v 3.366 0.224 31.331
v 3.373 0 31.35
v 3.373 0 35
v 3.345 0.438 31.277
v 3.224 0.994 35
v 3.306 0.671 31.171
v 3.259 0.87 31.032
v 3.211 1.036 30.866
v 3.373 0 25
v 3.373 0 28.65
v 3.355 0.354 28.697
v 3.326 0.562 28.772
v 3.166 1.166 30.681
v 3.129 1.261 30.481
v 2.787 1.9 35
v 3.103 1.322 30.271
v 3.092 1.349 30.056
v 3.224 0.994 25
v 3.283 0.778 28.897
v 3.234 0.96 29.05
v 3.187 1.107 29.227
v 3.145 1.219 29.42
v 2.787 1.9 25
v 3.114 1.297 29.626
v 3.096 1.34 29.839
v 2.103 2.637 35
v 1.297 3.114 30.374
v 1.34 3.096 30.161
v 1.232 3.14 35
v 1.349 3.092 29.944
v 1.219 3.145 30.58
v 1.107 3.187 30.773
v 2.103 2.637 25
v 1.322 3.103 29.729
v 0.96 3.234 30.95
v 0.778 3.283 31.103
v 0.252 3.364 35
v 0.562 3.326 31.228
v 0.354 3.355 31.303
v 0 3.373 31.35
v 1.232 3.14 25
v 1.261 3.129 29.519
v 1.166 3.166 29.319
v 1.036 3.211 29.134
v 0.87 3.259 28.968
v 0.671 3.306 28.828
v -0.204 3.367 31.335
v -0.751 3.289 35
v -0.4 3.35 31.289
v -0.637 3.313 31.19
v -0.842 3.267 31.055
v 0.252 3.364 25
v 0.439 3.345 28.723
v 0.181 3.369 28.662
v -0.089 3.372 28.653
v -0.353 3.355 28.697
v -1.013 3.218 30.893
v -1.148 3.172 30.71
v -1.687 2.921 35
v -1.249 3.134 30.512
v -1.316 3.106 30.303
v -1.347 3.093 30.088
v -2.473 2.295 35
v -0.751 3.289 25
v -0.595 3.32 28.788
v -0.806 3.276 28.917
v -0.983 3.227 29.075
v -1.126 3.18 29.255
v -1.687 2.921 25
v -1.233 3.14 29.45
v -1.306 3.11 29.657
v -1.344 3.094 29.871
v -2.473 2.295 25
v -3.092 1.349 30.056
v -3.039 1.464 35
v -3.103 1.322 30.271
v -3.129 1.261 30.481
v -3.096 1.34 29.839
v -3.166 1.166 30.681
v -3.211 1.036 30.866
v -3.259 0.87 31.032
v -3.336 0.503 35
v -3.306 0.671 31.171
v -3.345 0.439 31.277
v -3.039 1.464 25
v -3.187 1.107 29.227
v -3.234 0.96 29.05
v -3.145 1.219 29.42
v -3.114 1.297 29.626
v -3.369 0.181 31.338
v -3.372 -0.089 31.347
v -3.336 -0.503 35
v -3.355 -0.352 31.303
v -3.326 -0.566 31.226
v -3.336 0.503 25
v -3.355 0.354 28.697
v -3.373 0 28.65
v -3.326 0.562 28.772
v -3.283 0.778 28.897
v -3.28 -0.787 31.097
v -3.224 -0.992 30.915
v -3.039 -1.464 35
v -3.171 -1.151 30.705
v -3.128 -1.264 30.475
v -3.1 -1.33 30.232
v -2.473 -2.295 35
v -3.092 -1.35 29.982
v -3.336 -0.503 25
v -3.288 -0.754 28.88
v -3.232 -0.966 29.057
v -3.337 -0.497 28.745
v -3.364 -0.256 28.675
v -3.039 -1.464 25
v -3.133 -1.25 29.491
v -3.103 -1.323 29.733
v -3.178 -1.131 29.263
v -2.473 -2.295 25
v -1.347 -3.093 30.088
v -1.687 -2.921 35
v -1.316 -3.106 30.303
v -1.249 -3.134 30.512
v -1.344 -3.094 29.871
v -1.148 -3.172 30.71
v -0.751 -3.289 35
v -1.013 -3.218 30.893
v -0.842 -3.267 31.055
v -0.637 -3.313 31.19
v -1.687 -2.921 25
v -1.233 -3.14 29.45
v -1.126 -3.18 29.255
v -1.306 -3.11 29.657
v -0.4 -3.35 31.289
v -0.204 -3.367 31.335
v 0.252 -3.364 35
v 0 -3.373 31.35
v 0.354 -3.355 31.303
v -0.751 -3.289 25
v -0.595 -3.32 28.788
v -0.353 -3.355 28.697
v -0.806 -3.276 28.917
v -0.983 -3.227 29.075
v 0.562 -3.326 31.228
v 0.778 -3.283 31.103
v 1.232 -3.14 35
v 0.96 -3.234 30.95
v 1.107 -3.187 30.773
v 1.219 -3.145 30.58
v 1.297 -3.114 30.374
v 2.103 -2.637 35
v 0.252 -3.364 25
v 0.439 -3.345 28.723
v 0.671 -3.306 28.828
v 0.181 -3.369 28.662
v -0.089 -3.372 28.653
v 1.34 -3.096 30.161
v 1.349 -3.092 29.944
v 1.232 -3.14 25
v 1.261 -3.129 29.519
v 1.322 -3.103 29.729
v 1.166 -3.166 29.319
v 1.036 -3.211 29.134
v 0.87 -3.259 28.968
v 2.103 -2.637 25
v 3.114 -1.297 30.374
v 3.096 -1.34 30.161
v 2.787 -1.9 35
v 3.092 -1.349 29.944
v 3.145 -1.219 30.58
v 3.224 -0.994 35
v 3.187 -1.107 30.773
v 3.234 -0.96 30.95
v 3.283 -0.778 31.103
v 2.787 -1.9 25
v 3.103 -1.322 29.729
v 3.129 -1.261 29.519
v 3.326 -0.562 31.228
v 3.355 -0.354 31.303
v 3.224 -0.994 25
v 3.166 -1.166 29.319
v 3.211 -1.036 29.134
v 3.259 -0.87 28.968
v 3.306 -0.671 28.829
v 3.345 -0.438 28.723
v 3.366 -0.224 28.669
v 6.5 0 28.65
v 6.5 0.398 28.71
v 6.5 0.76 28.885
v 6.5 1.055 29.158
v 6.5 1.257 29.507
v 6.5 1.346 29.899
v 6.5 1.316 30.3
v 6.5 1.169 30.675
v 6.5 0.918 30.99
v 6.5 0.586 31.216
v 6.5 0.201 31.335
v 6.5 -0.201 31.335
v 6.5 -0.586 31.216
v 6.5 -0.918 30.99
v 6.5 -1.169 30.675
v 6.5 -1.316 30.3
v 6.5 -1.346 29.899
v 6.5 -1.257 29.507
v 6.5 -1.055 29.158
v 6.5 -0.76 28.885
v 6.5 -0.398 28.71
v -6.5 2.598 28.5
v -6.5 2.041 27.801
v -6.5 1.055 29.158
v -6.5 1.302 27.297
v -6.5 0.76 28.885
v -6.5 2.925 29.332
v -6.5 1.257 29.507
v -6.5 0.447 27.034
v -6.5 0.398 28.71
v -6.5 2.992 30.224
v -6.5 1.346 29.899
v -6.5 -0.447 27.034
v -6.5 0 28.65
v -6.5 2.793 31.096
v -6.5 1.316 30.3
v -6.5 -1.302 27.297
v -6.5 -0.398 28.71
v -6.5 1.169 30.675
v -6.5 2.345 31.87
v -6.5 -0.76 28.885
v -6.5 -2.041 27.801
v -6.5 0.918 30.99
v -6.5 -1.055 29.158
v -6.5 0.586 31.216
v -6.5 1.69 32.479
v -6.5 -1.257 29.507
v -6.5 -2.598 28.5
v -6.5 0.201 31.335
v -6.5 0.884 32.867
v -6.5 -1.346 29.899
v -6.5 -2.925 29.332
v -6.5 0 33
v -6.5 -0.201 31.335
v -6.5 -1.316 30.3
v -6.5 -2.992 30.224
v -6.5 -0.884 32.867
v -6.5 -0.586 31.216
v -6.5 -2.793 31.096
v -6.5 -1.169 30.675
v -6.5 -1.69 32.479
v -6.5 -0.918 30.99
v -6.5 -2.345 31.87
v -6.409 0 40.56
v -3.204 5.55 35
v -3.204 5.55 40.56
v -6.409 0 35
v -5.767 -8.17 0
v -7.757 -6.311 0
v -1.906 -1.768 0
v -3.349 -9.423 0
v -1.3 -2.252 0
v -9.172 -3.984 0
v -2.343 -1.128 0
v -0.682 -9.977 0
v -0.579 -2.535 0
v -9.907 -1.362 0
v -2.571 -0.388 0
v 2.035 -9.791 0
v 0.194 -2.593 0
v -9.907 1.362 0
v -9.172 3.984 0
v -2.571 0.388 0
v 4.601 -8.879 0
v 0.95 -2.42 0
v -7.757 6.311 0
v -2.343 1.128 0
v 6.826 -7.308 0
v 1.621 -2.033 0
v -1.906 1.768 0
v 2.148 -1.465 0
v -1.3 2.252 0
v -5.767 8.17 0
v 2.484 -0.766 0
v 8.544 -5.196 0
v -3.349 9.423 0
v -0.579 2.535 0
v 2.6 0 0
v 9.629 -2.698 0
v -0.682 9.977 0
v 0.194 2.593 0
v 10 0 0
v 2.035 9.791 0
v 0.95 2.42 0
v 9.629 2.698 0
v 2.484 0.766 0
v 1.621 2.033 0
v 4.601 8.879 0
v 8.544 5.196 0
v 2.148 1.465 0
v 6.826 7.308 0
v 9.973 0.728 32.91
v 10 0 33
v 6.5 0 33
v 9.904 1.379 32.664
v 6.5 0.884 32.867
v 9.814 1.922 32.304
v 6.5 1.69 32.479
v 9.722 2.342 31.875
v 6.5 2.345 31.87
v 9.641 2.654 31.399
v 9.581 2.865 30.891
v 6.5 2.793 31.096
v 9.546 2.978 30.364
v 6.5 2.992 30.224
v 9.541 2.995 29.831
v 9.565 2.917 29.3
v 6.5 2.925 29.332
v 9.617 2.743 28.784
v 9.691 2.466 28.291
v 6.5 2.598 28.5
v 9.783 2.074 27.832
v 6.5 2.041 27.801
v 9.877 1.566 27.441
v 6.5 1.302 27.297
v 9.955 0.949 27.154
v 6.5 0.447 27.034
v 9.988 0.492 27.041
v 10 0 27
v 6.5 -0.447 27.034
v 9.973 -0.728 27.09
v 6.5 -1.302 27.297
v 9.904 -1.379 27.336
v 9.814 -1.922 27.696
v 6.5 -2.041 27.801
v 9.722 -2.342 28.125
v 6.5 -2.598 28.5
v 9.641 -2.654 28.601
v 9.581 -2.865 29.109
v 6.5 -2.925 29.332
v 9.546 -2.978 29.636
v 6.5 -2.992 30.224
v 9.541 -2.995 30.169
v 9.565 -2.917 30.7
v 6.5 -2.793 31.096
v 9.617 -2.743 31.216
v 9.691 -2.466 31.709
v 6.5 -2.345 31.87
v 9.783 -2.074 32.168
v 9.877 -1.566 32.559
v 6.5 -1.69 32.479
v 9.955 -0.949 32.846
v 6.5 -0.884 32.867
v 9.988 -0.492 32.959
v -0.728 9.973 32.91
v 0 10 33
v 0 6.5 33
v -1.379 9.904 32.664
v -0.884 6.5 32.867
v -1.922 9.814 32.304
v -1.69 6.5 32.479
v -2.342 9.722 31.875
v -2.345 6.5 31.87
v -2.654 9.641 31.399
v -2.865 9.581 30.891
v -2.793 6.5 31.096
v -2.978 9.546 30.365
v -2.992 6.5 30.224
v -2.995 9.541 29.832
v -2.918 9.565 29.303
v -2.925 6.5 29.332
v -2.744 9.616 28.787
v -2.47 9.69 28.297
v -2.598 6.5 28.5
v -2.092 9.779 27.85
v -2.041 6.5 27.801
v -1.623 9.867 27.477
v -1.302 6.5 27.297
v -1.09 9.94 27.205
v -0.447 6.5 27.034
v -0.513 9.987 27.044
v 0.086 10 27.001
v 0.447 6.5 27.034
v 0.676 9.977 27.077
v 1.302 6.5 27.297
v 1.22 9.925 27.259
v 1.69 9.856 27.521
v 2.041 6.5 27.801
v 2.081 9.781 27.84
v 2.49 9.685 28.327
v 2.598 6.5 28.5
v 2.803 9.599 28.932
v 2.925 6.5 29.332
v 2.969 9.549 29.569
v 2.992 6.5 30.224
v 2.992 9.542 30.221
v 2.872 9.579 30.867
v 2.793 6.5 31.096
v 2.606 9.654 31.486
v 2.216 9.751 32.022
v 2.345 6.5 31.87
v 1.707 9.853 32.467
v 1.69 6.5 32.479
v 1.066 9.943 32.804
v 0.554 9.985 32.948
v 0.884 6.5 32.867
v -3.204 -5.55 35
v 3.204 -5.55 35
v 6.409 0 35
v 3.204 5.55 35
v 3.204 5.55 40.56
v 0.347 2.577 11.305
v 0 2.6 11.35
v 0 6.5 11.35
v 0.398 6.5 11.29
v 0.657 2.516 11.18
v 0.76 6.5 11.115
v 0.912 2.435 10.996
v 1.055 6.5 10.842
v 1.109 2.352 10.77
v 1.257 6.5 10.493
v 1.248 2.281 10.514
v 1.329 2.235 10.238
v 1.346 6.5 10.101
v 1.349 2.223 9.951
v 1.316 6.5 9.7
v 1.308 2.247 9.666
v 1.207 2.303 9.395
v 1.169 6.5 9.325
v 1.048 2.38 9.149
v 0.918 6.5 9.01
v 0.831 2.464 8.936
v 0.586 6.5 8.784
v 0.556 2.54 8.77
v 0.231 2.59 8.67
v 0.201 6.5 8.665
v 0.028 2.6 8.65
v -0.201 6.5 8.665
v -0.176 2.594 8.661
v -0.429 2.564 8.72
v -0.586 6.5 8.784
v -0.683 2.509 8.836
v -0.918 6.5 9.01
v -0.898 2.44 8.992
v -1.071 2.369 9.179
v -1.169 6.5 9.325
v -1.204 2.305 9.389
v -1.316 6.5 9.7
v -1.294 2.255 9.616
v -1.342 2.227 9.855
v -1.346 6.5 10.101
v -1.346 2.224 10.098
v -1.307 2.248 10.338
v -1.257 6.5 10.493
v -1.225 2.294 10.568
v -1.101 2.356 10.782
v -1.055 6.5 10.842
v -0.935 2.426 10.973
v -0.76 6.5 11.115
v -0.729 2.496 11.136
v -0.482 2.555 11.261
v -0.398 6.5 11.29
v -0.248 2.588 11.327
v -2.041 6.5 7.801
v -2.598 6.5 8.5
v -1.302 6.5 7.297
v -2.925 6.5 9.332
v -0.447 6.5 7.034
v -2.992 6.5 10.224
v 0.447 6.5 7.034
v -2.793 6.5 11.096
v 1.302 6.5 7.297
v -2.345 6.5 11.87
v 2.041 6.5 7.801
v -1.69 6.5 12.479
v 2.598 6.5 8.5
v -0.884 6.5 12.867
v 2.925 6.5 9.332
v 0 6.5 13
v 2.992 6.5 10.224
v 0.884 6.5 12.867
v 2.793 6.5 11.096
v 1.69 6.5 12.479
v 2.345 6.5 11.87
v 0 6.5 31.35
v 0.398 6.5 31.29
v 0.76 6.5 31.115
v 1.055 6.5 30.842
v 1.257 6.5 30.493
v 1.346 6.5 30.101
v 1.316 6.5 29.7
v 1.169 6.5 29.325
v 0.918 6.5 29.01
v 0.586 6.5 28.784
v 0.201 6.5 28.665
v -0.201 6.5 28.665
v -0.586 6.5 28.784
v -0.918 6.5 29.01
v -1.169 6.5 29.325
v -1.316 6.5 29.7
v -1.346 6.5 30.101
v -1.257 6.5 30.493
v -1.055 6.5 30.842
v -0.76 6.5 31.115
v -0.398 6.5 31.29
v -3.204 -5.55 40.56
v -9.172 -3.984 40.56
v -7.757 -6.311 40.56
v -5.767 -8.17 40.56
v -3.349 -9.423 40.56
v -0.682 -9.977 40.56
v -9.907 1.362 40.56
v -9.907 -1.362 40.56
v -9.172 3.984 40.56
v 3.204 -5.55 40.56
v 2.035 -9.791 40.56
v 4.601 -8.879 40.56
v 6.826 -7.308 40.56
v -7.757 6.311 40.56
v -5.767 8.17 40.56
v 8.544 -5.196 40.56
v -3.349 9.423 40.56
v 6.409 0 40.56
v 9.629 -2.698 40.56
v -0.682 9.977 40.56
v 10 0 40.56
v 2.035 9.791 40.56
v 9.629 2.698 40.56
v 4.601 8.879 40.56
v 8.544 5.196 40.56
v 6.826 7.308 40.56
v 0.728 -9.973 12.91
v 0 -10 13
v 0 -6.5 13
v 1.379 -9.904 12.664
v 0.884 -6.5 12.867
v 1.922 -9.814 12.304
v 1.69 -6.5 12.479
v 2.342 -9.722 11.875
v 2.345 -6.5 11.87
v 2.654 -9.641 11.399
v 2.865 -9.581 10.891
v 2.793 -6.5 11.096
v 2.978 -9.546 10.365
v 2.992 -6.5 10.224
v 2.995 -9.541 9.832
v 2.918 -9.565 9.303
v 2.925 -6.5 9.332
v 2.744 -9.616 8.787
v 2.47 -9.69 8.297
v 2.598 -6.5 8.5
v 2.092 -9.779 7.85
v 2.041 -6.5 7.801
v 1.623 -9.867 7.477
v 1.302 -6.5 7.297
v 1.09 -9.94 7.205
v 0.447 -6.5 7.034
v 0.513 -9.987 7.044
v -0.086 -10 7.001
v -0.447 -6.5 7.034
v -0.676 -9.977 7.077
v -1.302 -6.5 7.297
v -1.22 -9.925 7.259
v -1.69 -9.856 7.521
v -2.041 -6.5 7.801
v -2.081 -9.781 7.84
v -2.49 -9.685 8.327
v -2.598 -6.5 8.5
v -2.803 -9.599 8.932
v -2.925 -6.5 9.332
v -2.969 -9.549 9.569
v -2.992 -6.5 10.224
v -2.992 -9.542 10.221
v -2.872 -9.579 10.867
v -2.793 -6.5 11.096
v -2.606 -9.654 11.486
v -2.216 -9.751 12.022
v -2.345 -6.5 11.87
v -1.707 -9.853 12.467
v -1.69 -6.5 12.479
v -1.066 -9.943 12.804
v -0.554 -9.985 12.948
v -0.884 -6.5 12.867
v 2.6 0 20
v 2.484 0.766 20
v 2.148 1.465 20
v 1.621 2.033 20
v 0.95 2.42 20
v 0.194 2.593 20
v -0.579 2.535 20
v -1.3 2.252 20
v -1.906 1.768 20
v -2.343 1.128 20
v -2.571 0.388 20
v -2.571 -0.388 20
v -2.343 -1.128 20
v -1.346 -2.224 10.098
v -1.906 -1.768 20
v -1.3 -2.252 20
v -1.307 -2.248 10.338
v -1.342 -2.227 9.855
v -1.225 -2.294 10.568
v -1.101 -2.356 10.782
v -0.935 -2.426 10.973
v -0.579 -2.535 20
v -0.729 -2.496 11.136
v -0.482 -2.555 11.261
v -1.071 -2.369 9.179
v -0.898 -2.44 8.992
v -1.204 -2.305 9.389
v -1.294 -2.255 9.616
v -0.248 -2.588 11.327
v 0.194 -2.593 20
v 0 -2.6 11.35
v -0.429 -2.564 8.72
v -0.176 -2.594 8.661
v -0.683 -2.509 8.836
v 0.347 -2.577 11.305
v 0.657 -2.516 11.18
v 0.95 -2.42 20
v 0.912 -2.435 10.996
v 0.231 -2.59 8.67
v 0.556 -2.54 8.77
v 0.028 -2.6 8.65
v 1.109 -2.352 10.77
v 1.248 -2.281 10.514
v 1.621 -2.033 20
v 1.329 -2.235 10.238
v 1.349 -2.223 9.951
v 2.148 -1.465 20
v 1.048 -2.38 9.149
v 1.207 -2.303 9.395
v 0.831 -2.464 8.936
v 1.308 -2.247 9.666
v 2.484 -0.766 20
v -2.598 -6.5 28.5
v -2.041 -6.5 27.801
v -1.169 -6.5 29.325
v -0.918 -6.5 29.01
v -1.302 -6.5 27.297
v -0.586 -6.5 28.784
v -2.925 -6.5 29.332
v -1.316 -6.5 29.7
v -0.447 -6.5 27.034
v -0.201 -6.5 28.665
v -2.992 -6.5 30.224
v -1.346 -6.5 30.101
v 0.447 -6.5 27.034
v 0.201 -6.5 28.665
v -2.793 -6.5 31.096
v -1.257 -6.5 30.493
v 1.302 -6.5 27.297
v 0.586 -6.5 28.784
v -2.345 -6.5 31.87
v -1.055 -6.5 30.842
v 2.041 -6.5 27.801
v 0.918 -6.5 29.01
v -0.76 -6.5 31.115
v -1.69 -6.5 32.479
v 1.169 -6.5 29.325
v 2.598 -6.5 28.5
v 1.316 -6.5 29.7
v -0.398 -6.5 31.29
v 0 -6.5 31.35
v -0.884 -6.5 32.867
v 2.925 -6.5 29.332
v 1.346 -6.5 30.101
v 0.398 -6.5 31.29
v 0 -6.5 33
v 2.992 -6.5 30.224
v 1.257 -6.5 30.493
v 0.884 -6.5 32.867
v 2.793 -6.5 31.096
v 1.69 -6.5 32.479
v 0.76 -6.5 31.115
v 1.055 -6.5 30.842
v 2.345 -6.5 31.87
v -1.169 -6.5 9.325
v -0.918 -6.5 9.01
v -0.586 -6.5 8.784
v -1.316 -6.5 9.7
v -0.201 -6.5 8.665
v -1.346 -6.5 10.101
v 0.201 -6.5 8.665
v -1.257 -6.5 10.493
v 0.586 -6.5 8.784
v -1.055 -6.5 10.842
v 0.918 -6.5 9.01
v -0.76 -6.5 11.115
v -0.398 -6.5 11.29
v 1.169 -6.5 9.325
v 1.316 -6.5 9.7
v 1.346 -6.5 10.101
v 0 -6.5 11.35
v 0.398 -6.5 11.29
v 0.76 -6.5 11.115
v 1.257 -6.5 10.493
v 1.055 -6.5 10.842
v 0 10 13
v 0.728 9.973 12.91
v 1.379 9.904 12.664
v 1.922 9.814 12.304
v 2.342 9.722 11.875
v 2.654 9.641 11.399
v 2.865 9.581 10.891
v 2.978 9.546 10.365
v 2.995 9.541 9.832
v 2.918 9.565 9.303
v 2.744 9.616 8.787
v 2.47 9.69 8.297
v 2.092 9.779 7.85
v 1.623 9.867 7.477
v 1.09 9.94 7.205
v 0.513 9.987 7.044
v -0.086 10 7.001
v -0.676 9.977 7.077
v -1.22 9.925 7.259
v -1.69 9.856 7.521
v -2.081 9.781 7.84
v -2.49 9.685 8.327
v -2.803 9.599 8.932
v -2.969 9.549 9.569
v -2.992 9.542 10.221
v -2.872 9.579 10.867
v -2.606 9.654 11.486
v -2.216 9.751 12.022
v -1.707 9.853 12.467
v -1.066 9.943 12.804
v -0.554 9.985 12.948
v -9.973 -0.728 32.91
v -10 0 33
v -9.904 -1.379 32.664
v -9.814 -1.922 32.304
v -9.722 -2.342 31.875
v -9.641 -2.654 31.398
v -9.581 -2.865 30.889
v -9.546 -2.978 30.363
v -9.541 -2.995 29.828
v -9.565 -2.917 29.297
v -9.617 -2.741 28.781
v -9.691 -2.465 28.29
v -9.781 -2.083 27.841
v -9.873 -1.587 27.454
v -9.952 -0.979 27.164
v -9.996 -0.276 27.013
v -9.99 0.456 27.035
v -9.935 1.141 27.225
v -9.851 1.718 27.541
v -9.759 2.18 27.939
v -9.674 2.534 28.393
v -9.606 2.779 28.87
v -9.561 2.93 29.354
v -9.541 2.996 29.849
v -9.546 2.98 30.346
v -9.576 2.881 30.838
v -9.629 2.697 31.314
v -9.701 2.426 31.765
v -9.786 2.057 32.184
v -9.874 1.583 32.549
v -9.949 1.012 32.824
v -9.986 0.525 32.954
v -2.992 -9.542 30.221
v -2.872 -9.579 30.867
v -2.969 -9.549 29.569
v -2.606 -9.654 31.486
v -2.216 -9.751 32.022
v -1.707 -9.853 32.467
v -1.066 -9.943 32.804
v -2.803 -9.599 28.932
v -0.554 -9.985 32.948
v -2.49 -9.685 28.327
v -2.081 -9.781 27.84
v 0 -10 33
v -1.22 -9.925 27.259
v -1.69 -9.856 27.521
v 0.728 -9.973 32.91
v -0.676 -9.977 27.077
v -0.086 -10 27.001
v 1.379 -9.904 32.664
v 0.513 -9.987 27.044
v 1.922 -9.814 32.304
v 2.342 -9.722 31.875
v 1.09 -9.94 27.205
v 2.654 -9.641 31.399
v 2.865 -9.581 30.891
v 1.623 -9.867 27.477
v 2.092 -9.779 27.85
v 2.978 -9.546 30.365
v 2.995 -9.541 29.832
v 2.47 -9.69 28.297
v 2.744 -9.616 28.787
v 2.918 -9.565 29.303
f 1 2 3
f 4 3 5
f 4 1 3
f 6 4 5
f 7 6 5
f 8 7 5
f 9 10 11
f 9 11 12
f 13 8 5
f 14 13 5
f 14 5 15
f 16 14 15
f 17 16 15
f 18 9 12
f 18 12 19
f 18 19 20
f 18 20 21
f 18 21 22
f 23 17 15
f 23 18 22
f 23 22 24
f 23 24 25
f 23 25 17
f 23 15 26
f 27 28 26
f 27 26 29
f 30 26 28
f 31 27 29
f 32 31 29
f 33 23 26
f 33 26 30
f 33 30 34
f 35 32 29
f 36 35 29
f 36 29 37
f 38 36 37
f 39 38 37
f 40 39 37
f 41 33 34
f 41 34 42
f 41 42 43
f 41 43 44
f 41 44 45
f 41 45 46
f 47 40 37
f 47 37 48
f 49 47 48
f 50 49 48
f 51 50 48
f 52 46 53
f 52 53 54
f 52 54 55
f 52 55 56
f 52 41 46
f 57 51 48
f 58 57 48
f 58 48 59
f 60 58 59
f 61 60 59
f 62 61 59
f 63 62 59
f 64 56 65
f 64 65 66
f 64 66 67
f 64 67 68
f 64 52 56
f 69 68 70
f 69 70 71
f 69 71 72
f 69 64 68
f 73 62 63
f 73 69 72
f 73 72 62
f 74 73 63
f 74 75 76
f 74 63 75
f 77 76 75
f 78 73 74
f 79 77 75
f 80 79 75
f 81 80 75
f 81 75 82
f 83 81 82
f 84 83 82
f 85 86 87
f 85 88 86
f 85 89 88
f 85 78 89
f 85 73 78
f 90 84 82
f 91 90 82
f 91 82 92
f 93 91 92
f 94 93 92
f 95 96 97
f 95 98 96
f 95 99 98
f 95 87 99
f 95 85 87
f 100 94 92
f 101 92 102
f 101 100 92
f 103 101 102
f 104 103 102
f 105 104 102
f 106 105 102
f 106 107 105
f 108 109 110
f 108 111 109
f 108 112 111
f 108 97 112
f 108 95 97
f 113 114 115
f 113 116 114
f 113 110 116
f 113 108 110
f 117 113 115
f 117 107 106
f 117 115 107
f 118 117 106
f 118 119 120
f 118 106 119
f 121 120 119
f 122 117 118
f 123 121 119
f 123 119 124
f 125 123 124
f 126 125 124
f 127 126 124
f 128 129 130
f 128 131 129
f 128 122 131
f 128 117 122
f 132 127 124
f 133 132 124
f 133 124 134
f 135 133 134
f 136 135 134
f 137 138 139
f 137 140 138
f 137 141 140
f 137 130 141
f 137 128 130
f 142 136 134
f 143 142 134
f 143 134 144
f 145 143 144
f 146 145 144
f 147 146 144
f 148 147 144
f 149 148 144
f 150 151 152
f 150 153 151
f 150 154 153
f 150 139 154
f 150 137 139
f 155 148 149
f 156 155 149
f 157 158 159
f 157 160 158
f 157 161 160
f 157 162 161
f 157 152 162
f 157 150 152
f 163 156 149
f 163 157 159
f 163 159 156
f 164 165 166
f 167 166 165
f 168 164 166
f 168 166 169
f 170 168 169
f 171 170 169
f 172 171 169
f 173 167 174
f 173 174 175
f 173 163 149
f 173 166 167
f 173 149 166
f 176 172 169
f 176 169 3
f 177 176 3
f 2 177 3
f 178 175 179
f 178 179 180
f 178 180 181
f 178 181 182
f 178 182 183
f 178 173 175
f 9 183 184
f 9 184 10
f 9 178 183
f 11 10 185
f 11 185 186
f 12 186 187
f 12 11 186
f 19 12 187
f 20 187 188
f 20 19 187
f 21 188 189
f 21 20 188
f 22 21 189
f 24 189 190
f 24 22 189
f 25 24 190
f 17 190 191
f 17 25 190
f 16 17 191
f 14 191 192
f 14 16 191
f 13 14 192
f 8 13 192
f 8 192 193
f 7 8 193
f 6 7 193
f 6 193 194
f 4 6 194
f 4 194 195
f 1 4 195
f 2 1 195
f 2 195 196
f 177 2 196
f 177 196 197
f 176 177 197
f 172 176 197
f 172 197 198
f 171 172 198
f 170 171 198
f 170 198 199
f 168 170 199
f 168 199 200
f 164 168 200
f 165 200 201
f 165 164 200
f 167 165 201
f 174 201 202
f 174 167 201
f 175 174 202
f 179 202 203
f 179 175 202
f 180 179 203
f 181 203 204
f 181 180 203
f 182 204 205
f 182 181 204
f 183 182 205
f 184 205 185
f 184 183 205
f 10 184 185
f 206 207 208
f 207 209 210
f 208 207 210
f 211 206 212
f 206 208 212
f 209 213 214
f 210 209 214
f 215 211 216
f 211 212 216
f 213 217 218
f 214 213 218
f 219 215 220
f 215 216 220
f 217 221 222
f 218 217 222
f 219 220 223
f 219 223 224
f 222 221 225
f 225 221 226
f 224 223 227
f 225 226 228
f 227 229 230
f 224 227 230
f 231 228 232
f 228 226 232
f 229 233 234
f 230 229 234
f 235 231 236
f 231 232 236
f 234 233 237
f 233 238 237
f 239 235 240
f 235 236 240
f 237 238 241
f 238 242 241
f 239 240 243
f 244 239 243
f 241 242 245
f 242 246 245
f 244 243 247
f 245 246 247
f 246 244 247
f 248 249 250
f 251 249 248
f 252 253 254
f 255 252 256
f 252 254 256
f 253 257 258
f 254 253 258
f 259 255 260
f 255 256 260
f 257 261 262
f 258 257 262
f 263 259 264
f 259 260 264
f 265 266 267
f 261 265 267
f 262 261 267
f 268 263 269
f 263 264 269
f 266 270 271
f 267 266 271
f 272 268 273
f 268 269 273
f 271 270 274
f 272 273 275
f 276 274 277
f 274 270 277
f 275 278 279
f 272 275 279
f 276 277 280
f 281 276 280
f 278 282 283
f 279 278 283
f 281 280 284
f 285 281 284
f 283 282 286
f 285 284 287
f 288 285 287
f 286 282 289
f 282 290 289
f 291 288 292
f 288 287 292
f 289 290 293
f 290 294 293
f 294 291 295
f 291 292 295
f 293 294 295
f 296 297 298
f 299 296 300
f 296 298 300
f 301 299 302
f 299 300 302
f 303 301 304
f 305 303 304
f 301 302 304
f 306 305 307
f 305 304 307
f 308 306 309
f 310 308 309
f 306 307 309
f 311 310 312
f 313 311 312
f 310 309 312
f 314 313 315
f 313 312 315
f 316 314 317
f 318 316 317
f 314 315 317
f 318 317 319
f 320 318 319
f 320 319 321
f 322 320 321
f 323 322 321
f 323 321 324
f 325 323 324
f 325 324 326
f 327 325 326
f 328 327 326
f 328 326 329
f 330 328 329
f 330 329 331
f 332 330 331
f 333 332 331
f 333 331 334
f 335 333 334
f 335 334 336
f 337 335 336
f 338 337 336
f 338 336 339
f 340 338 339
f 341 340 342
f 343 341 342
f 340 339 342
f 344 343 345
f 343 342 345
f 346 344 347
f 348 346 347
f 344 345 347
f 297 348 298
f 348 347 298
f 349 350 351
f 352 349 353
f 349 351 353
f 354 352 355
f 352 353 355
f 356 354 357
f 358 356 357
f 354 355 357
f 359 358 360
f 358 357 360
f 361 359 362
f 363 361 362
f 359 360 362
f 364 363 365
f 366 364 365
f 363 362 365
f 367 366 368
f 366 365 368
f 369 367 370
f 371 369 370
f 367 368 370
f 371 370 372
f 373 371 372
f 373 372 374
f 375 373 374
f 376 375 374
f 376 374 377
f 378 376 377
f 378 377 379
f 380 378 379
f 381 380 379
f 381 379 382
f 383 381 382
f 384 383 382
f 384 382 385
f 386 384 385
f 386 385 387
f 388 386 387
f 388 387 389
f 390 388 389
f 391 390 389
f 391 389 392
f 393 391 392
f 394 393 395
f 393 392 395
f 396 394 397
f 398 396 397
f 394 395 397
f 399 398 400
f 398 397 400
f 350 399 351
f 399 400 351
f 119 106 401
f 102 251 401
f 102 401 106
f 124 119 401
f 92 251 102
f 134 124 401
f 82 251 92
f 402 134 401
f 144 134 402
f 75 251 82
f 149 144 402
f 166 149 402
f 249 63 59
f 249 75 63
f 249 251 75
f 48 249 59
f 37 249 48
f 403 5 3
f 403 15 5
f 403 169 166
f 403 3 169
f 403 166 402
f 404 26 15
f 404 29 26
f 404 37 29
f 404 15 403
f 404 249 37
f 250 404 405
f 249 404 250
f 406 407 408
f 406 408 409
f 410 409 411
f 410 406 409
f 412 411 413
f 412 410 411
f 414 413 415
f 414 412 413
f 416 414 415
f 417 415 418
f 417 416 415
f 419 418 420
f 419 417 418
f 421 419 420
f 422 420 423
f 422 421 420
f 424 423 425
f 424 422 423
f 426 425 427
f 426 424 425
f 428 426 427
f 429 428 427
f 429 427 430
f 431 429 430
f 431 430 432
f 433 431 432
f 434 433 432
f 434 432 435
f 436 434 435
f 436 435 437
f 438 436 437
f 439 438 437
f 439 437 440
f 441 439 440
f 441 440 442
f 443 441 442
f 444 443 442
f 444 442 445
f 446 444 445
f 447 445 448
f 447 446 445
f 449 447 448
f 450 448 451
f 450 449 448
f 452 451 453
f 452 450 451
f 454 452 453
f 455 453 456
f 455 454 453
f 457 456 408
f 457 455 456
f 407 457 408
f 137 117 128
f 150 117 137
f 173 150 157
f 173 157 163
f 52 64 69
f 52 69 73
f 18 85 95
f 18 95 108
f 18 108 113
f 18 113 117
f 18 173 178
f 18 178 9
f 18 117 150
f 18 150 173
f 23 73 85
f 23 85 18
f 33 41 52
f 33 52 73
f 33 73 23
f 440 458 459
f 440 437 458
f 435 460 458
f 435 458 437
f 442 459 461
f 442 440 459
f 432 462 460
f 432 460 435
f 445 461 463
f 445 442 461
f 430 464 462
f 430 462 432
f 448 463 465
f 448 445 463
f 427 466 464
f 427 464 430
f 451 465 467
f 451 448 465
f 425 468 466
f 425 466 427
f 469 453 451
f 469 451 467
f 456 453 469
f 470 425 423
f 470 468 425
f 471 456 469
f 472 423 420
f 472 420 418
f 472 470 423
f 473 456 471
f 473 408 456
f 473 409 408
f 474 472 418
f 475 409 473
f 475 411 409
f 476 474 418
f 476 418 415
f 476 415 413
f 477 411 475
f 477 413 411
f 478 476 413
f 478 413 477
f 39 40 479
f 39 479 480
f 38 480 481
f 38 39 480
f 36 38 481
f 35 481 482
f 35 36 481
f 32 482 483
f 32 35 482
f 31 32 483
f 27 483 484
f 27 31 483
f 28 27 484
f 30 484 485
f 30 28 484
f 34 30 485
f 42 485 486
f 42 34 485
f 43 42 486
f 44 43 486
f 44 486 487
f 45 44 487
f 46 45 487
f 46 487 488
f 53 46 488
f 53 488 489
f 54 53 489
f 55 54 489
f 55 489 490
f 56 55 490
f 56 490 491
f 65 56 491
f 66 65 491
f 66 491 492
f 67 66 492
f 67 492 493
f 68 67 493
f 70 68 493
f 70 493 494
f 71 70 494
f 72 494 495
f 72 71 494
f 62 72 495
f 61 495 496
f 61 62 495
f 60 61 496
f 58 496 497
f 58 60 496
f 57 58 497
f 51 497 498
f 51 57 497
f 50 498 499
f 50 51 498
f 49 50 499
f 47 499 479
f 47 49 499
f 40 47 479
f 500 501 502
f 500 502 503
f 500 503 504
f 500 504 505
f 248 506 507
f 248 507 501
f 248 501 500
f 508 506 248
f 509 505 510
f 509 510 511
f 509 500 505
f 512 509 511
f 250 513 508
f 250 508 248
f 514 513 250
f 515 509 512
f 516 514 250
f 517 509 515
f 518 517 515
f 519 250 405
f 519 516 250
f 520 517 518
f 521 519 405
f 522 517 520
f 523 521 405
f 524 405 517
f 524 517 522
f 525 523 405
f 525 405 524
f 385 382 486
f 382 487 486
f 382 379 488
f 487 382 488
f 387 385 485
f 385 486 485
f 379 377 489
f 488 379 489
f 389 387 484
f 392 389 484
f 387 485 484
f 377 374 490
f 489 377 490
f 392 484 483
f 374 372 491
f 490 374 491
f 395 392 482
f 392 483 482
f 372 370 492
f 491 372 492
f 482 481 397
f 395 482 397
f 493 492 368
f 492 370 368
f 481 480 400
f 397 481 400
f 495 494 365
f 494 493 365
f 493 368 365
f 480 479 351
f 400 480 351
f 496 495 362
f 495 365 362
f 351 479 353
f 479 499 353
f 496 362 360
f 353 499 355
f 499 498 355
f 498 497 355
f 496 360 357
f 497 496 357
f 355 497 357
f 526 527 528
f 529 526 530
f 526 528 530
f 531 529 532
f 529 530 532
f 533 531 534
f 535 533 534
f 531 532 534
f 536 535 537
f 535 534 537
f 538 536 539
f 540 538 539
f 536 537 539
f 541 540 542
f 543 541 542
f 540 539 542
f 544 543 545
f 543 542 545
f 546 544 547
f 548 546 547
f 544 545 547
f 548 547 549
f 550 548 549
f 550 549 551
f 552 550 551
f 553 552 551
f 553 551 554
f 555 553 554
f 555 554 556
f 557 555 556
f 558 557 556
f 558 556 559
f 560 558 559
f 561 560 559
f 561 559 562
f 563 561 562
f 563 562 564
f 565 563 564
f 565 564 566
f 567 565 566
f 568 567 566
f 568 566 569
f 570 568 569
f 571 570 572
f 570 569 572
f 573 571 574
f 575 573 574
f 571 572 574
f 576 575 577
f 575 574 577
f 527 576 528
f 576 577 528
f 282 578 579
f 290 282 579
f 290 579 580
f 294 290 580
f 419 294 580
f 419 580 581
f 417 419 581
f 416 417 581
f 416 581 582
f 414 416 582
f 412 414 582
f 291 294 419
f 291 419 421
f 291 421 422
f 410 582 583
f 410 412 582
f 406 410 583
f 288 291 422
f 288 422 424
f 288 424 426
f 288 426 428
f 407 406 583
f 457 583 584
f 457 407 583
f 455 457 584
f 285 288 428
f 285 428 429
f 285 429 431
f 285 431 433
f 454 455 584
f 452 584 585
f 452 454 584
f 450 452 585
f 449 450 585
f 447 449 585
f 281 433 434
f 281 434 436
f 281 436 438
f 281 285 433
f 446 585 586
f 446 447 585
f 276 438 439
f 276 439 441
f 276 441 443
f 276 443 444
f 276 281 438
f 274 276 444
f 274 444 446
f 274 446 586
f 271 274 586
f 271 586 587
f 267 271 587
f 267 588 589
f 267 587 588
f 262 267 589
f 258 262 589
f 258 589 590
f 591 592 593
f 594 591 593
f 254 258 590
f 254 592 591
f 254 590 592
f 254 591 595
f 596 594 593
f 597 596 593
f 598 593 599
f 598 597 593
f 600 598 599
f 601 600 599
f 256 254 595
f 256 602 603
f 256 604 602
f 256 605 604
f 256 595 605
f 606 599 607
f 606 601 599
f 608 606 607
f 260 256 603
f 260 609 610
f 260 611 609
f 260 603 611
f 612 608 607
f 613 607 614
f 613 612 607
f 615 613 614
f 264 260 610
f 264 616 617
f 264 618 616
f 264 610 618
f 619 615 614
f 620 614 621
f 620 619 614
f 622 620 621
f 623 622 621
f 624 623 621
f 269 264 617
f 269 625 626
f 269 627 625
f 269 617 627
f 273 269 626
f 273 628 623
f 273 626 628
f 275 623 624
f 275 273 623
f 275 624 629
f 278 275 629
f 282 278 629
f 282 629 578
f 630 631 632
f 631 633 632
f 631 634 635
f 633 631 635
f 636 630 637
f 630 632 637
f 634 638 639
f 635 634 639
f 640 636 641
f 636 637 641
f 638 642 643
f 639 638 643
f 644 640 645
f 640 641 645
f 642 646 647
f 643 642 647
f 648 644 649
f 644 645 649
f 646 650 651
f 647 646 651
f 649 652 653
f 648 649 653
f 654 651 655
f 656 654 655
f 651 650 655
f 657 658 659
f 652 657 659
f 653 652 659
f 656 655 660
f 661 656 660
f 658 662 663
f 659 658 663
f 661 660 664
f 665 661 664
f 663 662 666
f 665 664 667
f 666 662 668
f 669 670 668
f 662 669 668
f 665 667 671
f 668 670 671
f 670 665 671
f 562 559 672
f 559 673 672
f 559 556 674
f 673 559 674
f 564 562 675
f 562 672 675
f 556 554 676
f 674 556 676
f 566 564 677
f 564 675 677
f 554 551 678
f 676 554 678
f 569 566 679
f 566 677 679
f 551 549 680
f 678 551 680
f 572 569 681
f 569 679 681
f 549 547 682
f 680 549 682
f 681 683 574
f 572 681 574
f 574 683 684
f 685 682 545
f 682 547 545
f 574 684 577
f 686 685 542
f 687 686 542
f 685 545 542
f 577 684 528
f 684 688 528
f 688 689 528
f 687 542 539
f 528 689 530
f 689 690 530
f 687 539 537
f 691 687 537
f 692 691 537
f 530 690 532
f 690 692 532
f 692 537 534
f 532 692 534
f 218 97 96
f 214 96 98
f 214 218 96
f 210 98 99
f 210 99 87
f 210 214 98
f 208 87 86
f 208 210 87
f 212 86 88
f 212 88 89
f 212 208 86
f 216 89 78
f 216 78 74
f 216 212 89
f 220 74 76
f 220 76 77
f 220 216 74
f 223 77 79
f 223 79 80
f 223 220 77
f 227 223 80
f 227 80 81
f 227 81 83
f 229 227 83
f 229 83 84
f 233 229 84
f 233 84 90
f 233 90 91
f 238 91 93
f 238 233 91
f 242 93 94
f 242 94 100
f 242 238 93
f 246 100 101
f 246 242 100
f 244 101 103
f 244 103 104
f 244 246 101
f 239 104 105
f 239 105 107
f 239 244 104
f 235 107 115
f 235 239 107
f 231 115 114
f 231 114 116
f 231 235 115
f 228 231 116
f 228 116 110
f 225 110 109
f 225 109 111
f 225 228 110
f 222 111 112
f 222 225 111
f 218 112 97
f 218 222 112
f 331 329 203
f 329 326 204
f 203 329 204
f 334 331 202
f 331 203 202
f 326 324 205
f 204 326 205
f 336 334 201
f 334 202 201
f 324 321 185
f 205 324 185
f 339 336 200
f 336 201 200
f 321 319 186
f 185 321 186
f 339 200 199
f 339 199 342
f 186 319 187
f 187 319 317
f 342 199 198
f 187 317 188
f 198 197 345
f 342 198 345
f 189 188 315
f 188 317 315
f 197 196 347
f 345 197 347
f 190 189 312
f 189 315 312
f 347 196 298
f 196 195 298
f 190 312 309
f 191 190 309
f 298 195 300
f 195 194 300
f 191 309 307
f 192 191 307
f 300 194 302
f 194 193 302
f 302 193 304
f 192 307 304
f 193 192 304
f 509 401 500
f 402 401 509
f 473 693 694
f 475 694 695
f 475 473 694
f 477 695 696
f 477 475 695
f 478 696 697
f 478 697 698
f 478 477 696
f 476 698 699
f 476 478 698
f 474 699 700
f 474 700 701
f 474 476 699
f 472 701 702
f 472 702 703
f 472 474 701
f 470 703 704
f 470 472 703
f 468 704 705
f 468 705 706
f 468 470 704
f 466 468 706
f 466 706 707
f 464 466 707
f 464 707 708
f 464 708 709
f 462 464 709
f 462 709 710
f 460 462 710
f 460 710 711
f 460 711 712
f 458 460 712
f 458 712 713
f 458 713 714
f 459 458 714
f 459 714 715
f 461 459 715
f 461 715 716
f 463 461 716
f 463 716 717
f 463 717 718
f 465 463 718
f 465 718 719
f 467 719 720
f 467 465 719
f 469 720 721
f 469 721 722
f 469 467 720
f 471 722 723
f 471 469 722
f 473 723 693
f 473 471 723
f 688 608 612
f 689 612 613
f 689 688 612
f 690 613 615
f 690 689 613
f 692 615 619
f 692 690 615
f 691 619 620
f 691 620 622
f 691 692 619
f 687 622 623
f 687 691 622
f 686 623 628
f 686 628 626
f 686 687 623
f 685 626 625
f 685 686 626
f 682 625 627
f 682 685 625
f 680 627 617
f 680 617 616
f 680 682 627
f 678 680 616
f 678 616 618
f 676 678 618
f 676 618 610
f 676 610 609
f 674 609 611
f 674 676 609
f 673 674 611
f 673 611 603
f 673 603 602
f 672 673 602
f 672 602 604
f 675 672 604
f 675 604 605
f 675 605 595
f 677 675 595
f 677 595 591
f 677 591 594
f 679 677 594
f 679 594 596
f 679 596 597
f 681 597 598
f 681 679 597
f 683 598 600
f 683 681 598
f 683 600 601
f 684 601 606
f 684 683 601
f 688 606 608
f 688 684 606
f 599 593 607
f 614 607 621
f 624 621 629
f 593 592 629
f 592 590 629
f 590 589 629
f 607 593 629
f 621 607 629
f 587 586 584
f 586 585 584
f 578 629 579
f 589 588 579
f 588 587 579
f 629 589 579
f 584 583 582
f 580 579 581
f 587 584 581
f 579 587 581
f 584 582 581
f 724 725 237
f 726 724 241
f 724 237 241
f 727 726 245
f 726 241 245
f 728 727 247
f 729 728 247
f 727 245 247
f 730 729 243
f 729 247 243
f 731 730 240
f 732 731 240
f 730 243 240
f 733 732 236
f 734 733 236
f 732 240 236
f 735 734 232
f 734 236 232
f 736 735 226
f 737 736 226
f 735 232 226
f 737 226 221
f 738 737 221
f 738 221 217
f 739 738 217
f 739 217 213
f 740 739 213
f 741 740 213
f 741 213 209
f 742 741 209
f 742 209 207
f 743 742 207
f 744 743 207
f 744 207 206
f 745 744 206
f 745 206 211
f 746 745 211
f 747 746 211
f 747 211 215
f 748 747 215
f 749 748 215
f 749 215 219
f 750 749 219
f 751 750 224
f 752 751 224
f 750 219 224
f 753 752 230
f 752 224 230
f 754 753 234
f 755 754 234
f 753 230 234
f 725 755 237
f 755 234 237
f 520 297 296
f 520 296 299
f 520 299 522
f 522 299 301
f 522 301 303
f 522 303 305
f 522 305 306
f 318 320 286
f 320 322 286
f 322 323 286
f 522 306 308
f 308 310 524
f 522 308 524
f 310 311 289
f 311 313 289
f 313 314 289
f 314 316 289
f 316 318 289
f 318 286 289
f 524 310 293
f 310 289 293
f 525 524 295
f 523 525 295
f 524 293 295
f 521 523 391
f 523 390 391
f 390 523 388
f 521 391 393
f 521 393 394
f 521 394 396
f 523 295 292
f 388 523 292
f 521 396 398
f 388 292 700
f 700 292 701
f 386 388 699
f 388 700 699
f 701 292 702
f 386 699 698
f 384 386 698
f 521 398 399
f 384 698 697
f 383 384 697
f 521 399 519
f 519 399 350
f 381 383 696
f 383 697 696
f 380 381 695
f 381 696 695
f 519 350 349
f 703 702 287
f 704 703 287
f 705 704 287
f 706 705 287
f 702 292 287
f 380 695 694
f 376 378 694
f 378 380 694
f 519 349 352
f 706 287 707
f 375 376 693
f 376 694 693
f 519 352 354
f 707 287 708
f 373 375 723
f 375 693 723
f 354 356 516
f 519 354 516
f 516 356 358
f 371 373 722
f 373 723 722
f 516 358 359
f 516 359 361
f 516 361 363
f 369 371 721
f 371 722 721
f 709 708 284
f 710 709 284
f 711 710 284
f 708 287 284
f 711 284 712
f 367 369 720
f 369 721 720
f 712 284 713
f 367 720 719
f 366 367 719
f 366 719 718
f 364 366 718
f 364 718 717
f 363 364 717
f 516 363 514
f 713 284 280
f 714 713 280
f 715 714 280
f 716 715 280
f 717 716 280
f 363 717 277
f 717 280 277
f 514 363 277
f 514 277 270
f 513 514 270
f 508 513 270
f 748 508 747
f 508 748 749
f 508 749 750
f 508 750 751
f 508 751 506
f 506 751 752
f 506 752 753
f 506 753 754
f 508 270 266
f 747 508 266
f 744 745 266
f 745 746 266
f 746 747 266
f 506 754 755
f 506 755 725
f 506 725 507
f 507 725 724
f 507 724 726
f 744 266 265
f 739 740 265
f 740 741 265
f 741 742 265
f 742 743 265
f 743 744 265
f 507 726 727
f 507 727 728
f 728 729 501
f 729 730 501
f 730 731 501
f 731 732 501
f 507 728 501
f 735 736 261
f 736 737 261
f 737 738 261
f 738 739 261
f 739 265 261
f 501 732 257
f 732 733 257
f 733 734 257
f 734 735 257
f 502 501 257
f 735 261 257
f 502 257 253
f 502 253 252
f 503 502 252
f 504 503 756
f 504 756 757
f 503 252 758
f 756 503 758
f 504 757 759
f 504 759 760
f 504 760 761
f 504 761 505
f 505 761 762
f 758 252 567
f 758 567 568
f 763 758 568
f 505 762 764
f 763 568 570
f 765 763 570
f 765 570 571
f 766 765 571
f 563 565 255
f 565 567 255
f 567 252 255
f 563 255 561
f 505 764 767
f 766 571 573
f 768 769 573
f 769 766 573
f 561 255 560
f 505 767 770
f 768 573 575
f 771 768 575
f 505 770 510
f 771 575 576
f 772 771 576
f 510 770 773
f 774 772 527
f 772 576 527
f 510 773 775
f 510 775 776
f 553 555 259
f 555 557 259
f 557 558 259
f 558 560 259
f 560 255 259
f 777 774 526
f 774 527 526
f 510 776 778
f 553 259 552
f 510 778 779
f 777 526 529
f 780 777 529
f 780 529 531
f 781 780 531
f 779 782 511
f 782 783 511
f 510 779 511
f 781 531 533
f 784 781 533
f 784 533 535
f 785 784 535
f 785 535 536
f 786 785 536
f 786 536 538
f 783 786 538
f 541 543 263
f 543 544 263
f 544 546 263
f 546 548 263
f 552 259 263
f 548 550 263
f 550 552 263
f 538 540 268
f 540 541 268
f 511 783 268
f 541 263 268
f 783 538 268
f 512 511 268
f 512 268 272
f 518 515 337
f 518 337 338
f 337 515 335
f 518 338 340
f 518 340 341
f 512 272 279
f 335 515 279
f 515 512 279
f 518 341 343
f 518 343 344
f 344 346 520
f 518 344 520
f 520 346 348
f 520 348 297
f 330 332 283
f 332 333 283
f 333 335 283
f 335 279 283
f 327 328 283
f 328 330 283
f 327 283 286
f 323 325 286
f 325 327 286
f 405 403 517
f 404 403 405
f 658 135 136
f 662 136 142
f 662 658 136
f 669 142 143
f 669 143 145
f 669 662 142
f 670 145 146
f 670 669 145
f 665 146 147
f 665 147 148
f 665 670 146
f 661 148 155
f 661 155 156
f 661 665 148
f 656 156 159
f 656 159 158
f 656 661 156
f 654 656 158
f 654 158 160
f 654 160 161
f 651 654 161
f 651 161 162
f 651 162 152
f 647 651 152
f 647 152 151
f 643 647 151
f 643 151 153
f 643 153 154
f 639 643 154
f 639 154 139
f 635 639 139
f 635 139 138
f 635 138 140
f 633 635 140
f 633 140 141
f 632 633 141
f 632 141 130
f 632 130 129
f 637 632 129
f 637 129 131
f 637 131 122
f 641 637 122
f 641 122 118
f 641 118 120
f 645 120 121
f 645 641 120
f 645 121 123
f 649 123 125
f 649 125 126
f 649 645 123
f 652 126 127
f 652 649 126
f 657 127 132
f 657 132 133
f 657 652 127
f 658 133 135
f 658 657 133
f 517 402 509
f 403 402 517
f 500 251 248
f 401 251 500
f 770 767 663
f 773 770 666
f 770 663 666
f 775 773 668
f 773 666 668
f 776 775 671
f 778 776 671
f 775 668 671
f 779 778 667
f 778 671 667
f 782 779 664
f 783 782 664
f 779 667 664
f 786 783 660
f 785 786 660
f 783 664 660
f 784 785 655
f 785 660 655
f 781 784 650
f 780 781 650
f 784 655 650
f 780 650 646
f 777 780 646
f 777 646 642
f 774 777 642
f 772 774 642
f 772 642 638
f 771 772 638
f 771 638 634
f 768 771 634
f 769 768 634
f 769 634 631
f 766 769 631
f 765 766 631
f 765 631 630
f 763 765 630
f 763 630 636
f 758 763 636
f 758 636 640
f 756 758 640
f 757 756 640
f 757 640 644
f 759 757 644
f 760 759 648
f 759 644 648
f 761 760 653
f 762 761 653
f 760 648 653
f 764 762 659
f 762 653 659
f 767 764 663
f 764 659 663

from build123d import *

# Parameters (mm, degrees)
SKETCH1_R               = 10
SKETCH1_R_2             = 2.6
BOSS_EXTRUDE1_DEPTH     = 25
BOSS_EXTRUDE2_START     = -5
SKETCH2_R               = 10
BOSS_EXTRUDE2_DEPTH     = 5
CUT_EXTRUDE1_DEPTH      = 29.722813233
CUT_EXTRUDE1_DEPTH_BACK = 29.722813233
SKETCH3_R               = 1.35
SKETCH6_R               = 10
SKETCH6_R_2             = 3.3734375
BOSS_EXTRUDE4_DEPTH     = 10
CUT_EXTRUDE2_DEPTH      = 38.74917233
CUT_EXTRUDE2_DEPTH_BACK = 38.74917233
SKETCH7_R               = 1.35
CUT_EXTRUDE3_DEPTH      = 38.74917233
CUT_EXTRUDE3_DEPTH_BACK = 38.74917233
SKETCH8_R               = 1.35
SKETCH5_R               = 10
BOSS_EXTRUDE3_DEPTH     = 5.56
CUT_EXTRUDE4_START      = -6.5
SKETCH9_R               = 3
CUT_EXTRUDE4_DEPTH      = 25.4
CUT_EXTRUDE5_START      = -6.5
SKETCH10_R              = 3
CUT_EXTRUDE5_DEPTH      = 25.4
CIRPATTERN1_COUNT       = 4


with BuildPart() as part:
    # Sketch1 → Boss-Extrude1 (new body)
    with BuildSketch(Plane.XY):
        Circle(SKETCH1_R)
        Circle(SKETCH1_R_2, mode=Mode.SUBTRACT)
    extrude(amount=BOSS_EXTRUDE1_DEPTH)

    # Sketch2 → Boss-Extrude2 (add)
    with BuildSketch(Plane.XY.offset(25).offset(BOSS_EXTRUDE2_START)):
        Circle(SKETCH2_R)
    extrude(amount=BOSS_EXTRUDE2_DEPTH)

    # Sketch3 → Cut-Extrude1 (cut, two sides: drawn at the far end of the back side and taken through both)
    with BuildSketch(Plane(origin=(0, 0, 0), x_dir=(1, 0, 0), z_dir=(0, 1, 0)).offset(-CUT_EXTRUDE1_DEPTH_BACK)):
        with Locations((0, -10)):
            Circle(SKETCH3_R)
    extrude(amount=CUT_EXTRUDE1_DEPTH + CUT_EXTRUDE1_DEPTH_BACK, mode=Mode.SUBTRACT)

    # Sketch6 → Boss-Extrude4 (add)
    with BuildSketch(Plane.XY.offset(25)):
        Circle(SKETCH6_R)
        Circle(SKETCH6_R_2, mode=Mode.SUBTRACT)
    extrude(amount=BOSS_EXTRUDE4_DEPTH)

    # Sketch7 → Cut-Extrude2 (cut, two sides: drawn at the far end of the back side and taken through both)
    with BuildSketch(Plane(origin=(0, 0, 0), x_dir=(1, 0, 0), z_dir=(0, 1, 0)).offset(-CUT_EXTRUDE2_DEPTH_BACK)):
        with Locations((0, -30)):
            Circle(SKETCH7_R)
    extrude(amount=CUT_EXTRUDE2_DEPTH + CUT_EXTRUDE2_DEPTH_BACK, mode=Mode.SUBTRACT)

    # Sketch8 → Cut-Extrude3 (cut, two sides: drawn at the far end of the back side and taken through both)
    with BuildSketch(Plane(origin=(0, 0, 0), x_dir=(0, 0, -1), z_dir=(1, 0, 0)).offset(-CUT_EXTRUDE3_DEPTH_BACK)):
        with Locations((-30, 0)):
            Circle(SKETCH8_R)
    extrude(amount=CUT_EXTRUDE3_DEPTH + CUT_EXTRUDE3_DEPTH_BACK, mode=Mode.SUBTRACT)

    # Sketch5 → Boss-Extrude3 (add)
    with BuildSketch(Plane.XY.offset(35)):
        Circle(SKETCH5_R)
        Polygon((3.204293994, -5.55), (6.408587988, 0), (3.204293994, 5.55), (-3.204293994, 5.55), (-6.408587988, 0), (-3.204293994, -5.55), align=None, mode=Mode.SUBTRACT)
    extrude(amount=BOSS_EXTRUDE3_DEPTH)

    # Sketch9 → Cut-Extrude4 (cut)
    with BuildSketch(Plane(origin=(0, 0, 0), x_dir=(1, 0, 0), z_dir=(0, 1, 0)).offset(CUT_EXTRUDE4_START)):
        with Locations((0, -10)):
            Circle(SKETCH9_R)
    cut_extrude4 = extrude(amount=-CUT_EXTRUDE4_DEPTH, mode=Mode.SUBTRACT)

    # Mirror1: Cut-Extrude4 across plane
    add(cut_extrude4.mirror(Plane.ZX), mode=Mode.SUBTRACT)

    # Sketch10 → Cut-Extrude5 (cut)
    with BuildSketch(Plane(origin=(0, 0, 0), x_dir=(1, 0, 0), z_dir=(0, 1, 0)).offset(CUT_EXTRUDE5_START)):
        with Locations((0, -30)):
            Circle(SKETCH10_R)
    cut_extrude5 = extrude(amount=-CUT_EXTRUDE5_DEPTH, mode=Mode.SUBTRACT)

    # CirPattern1: Cut-Extrude5 ×4 about axis
    cirpattern1_axis = Axis((0, 0, 40.56), (0, 0, -1))
    for i in range(1, CIRPATTERN1_COUNT):
        add(cut_extrude5.rotate(cirpattern1_axis, i * 360 / CIRPATTERN1_COUNT), mode=Mode.SUBTRACT)


solid = part.part
